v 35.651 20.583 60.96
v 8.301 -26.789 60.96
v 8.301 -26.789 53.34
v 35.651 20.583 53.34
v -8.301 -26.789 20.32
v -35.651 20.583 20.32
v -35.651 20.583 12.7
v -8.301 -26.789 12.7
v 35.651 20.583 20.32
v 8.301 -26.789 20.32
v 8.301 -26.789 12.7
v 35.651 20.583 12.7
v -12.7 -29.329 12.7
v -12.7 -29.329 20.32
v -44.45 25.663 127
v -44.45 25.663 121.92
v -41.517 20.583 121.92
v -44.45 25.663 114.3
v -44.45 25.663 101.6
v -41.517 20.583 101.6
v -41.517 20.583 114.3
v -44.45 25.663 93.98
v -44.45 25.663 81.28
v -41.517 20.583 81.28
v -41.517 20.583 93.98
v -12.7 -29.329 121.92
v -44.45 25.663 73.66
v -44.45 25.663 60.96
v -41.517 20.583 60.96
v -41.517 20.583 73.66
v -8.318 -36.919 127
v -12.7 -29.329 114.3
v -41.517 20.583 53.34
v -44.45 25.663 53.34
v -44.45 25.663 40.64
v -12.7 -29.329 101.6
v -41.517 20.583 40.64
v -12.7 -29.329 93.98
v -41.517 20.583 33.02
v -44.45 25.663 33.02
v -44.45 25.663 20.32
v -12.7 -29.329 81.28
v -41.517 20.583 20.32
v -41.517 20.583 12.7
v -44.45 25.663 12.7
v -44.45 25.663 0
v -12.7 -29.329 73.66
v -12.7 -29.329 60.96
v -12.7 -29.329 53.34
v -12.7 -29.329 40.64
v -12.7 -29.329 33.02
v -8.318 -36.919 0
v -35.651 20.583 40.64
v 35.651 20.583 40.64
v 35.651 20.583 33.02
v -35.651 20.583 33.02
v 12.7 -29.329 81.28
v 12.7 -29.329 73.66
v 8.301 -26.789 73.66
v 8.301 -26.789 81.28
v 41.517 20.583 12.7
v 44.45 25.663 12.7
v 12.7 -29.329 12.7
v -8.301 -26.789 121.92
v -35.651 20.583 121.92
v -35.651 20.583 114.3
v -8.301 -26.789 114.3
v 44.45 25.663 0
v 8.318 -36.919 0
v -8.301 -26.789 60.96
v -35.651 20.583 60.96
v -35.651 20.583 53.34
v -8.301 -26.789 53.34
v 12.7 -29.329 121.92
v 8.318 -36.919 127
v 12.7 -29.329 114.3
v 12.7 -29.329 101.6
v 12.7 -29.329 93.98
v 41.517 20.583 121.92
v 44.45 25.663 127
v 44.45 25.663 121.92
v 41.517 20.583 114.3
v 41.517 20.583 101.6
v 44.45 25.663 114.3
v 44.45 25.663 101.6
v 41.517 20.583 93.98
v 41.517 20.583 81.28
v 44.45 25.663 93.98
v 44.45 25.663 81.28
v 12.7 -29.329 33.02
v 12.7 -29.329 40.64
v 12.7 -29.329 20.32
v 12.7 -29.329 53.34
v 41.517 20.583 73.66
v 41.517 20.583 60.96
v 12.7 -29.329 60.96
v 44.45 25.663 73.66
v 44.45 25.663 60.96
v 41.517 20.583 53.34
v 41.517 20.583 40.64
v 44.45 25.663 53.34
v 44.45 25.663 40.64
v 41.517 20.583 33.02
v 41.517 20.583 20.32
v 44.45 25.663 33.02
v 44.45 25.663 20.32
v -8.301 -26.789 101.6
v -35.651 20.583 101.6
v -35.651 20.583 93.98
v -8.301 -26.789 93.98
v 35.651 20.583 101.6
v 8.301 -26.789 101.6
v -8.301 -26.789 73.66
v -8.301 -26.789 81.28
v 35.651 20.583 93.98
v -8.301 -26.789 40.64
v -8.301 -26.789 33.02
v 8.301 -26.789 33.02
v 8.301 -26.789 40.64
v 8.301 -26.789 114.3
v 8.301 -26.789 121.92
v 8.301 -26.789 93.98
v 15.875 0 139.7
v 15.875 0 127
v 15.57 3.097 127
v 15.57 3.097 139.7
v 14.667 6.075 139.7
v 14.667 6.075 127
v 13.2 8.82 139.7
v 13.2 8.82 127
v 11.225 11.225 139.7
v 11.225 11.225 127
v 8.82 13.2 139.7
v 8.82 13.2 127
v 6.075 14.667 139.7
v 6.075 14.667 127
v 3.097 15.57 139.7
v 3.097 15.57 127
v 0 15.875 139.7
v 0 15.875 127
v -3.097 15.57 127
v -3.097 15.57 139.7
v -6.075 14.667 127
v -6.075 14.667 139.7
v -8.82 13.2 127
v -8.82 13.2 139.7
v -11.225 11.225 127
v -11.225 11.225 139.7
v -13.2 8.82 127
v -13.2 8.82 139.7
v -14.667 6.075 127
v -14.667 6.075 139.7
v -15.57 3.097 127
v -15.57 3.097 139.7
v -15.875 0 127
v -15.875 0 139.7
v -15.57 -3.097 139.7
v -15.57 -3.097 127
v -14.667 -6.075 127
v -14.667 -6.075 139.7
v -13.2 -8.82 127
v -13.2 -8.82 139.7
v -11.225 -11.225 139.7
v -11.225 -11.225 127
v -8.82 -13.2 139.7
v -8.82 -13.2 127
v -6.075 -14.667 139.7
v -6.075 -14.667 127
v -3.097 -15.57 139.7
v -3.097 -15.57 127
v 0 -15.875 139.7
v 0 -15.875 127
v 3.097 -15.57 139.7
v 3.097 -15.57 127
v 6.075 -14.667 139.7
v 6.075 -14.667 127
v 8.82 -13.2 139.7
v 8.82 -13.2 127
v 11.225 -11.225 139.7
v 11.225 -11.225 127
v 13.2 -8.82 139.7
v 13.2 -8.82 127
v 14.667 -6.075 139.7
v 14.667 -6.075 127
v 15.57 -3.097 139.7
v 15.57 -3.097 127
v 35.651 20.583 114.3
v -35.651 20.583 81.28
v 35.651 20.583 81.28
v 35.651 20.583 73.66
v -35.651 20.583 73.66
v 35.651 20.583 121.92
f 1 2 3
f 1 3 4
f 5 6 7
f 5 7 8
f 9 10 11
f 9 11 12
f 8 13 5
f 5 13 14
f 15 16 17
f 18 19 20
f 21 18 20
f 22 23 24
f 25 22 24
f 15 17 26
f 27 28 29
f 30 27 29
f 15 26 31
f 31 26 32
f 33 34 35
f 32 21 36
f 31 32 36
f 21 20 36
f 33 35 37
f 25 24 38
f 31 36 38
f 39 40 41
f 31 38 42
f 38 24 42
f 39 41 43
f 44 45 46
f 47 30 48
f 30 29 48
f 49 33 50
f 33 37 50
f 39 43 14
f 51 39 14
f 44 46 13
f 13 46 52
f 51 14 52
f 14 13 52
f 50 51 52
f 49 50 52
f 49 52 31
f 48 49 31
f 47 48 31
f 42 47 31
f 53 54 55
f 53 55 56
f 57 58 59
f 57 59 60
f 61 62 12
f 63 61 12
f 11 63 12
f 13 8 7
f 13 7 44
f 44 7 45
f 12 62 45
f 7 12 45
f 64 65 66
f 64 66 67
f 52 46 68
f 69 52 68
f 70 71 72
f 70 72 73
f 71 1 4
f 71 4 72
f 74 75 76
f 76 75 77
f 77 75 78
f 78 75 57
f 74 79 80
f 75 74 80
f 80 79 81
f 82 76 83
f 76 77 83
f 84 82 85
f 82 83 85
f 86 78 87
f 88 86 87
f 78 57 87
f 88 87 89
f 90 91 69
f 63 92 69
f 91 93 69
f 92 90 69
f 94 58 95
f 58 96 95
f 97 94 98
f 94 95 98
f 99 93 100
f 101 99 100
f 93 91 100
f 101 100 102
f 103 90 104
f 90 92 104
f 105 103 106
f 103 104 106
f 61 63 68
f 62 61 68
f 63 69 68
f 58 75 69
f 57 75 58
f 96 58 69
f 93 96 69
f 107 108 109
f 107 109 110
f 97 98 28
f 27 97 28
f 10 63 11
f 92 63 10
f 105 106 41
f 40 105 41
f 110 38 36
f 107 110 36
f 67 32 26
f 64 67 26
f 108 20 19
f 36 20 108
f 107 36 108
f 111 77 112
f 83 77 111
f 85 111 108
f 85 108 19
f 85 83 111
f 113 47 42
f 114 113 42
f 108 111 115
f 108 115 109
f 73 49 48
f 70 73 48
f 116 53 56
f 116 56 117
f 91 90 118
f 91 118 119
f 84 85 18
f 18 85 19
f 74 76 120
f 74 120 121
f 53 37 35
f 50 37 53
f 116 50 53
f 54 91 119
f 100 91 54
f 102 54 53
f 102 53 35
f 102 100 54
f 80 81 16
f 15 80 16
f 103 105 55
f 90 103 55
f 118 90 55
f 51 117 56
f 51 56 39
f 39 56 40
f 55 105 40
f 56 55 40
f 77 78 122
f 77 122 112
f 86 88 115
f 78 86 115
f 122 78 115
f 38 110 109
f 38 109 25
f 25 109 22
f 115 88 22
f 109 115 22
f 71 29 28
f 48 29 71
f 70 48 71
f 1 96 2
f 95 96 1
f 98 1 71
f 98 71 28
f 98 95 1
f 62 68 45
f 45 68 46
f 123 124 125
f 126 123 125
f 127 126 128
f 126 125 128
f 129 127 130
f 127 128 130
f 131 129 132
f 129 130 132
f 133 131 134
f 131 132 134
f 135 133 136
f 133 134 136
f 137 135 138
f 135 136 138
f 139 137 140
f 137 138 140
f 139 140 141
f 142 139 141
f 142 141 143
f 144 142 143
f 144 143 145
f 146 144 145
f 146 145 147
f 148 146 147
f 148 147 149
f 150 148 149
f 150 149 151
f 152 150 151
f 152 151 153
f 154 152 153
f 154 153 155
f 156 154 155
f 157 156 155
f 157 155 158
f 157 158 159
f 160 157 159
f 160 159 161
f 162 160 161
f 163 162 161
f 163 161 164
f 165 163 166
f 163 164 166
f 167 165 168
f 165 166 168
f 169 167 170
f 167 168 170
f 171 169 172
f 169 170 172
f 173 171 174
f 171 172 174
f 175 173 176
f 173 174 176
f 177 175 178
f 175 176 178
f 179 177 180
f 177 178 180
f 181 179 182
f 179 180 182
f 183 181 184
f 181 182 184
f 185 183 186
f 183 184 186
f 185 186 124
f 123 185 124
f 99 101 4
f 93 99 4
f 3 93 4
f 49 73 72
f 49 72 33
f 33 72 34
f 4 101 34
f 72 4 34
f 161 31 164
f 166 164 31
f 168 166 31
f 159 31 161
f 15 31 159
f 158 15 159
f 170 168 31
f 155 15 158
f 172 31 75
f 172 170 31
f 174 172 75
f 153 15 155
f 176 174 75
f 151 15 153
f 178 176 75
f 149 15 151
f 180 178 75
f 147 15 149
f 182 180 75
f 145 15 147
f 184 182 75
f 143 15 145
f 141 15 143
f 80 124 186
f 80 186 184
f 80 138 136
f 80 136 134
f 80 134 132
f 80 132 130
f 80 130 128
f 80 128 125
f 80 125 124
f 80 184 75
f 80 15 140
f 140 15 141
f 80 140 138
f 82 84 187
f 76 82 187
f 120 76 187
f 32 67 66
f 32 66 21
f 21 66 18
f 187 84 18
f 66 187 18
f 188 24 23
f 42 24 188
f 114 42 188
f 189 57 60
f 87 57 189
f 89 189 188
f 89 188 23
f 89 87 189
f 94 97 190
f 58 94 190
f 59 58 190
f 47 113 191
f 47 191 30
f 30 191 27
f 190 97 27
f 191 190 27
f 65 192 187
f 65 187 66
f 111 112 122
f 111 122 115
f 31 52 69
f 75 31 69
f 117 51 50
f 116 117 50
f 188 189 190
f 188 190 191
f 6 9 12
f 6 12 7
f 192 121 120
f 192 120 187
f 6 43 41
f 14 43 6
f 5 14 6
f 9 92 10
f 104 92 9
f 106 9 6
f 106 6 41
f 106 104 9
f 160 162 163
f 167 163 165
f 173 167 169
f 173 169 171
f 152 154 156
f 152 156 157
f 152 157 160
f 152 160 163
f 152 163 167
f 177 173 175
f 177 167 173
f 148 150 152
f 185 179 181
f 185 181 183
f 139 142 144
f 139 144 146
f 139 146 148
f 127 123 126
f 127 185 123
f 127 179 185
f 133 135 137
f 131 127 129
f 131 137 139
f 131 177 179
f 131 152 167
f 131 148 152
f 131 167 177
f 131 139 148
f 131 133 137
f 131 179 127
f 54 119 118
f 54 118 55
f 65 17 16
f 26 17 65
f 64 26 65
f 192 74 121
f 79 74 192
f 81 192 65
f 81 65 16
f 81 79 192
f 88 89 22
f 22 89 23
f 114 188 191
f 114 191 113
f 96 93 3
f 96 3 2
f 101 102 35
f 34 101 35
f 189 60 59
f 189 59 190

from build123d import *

# Parameters (mm, degrees)
F1_DEPTH  = 127
F2_W      = 89.5684185014
F2_H      = 63.5
F3_DEPTH  = 215.9
F4_R      = 15.875
F5_DEPTH  = 139.7
F6_W      = 88.9
F6_H      = 7.62
F7_DEPTH  = 5.08
F8_W      = 63.5
F8_H      = 7.62
F9_DEPTH  = 5.08
F10_W     = 63.5
F10_H     = 7.62
F11_DEPTH = 5.08


with BuildPart() as f1:
    # F0 (on Top) → F1 (new body)
    with BuildSketch(Plane.XY):
        Polygon((44.45, 25.6632194655), (-44.45, 25.6632194655), (0, -51.326438931), align=None)
    extrude(amount=F1_DEPTH)

    # F2 (on Top) → F3 (intersect)
    with BuildSketch(Plane.XY):
        with Locations((-0.2493504435, -5.1686391234)):
            Rectangle(F2_W, F2_H)
    extrude(amount=F3_DEPTH, mode=Mode.INTERSECT)

    # F4 (on Top) → F5 (join)
    with BuildSketch(Plane.XY):
        Circle(F4_R)
    extrude(amount=F5_DEPTH)

    # F6 (on face) → F7 (cut)
    with BuildSketch(Plane(origin=(0, 25.6632194655, 0), x_dir=(-1, 0, 0), z_dir=(0, 1, 0))):
        with Locations((0, 16.51)):
            Rectangle(F6_W, F6_H)
        with Locations((0, 36.83)):
            Rectangle(F6_W, F6_H)
        with Locations((0, 57.15)):
            Rectangle(F6_W, F6_H)
        with Locations((0, 77.47)):
            Rectangle(F6_W, F6_H)
        with Locations((0, 97.79)):
            Rectangle(F6_W, F6_H)
        with Locations((0, 118.11)):
            Rectangle(F6_W, F6_H)
    extrude(amount=-F7_DEPTH, mode=Mode.SUBTRACT)

    # F8 (on face) → F9 (cut)
    with BuildSketch(Plane(origin=(22.225, -12.8316097327, 0), x_dir=(0.5, 0.8660254038, 0), z_dir=(0.8660254038, -0.5, 0))):
        with Locations((12.7, 16.51)):
            Rectangle(F8_W, F8_H)
        with Locations((12.7, 36.83)):
            Rectangle(F8_W, F8_H)
        with Locations((12.7, 57.15)):
            Rectangle(F8_W, F8_H)
        with Locations((12.7, 77.47)):
            Rectangle(F8_W, F8_H)
        with Locations((12.7, 97.79)):
            Rectangle(F8_W, F8_H)
        with Locations((12.7, 118.11)):
            Rectangle(F8_W, F8_H)
    extrude(amount=-F9_DEPTH, mode=Mode.SUBTRACT)

    # F10 (on face) → F11 (cut)
    with BuildSketch(Plane(origin=(-22.225, -12.8316097327, 0), x_dir=(0.5, -0.8660254038, 0), z_dir=(-0.8660254038, -0.5, 0))):
        with Locations((-12.7, 16.51)):
            Rectangle(F10_W, F10_H)
        with Locations((-12.7, 36.83)):
            Rectangle(F10_W, F10_H)
        with Locations((-12.7, 57.15)):
            Rectangle(F10_W, F10_H)
        with Locations((-12.7, 77.47)):
            Rectangle(F10_W, F10_H)
        with Locations((-12.7, 97.79)):
            Rectangle(F10_W, F10_H)
        with Locations((-12.7, 118.11)):
            Rectangle(F10_W, F10_H)
    extrude(amount=-F11_DEPTH, mode=Mode.SUBTRACT)


solid = f1.part
